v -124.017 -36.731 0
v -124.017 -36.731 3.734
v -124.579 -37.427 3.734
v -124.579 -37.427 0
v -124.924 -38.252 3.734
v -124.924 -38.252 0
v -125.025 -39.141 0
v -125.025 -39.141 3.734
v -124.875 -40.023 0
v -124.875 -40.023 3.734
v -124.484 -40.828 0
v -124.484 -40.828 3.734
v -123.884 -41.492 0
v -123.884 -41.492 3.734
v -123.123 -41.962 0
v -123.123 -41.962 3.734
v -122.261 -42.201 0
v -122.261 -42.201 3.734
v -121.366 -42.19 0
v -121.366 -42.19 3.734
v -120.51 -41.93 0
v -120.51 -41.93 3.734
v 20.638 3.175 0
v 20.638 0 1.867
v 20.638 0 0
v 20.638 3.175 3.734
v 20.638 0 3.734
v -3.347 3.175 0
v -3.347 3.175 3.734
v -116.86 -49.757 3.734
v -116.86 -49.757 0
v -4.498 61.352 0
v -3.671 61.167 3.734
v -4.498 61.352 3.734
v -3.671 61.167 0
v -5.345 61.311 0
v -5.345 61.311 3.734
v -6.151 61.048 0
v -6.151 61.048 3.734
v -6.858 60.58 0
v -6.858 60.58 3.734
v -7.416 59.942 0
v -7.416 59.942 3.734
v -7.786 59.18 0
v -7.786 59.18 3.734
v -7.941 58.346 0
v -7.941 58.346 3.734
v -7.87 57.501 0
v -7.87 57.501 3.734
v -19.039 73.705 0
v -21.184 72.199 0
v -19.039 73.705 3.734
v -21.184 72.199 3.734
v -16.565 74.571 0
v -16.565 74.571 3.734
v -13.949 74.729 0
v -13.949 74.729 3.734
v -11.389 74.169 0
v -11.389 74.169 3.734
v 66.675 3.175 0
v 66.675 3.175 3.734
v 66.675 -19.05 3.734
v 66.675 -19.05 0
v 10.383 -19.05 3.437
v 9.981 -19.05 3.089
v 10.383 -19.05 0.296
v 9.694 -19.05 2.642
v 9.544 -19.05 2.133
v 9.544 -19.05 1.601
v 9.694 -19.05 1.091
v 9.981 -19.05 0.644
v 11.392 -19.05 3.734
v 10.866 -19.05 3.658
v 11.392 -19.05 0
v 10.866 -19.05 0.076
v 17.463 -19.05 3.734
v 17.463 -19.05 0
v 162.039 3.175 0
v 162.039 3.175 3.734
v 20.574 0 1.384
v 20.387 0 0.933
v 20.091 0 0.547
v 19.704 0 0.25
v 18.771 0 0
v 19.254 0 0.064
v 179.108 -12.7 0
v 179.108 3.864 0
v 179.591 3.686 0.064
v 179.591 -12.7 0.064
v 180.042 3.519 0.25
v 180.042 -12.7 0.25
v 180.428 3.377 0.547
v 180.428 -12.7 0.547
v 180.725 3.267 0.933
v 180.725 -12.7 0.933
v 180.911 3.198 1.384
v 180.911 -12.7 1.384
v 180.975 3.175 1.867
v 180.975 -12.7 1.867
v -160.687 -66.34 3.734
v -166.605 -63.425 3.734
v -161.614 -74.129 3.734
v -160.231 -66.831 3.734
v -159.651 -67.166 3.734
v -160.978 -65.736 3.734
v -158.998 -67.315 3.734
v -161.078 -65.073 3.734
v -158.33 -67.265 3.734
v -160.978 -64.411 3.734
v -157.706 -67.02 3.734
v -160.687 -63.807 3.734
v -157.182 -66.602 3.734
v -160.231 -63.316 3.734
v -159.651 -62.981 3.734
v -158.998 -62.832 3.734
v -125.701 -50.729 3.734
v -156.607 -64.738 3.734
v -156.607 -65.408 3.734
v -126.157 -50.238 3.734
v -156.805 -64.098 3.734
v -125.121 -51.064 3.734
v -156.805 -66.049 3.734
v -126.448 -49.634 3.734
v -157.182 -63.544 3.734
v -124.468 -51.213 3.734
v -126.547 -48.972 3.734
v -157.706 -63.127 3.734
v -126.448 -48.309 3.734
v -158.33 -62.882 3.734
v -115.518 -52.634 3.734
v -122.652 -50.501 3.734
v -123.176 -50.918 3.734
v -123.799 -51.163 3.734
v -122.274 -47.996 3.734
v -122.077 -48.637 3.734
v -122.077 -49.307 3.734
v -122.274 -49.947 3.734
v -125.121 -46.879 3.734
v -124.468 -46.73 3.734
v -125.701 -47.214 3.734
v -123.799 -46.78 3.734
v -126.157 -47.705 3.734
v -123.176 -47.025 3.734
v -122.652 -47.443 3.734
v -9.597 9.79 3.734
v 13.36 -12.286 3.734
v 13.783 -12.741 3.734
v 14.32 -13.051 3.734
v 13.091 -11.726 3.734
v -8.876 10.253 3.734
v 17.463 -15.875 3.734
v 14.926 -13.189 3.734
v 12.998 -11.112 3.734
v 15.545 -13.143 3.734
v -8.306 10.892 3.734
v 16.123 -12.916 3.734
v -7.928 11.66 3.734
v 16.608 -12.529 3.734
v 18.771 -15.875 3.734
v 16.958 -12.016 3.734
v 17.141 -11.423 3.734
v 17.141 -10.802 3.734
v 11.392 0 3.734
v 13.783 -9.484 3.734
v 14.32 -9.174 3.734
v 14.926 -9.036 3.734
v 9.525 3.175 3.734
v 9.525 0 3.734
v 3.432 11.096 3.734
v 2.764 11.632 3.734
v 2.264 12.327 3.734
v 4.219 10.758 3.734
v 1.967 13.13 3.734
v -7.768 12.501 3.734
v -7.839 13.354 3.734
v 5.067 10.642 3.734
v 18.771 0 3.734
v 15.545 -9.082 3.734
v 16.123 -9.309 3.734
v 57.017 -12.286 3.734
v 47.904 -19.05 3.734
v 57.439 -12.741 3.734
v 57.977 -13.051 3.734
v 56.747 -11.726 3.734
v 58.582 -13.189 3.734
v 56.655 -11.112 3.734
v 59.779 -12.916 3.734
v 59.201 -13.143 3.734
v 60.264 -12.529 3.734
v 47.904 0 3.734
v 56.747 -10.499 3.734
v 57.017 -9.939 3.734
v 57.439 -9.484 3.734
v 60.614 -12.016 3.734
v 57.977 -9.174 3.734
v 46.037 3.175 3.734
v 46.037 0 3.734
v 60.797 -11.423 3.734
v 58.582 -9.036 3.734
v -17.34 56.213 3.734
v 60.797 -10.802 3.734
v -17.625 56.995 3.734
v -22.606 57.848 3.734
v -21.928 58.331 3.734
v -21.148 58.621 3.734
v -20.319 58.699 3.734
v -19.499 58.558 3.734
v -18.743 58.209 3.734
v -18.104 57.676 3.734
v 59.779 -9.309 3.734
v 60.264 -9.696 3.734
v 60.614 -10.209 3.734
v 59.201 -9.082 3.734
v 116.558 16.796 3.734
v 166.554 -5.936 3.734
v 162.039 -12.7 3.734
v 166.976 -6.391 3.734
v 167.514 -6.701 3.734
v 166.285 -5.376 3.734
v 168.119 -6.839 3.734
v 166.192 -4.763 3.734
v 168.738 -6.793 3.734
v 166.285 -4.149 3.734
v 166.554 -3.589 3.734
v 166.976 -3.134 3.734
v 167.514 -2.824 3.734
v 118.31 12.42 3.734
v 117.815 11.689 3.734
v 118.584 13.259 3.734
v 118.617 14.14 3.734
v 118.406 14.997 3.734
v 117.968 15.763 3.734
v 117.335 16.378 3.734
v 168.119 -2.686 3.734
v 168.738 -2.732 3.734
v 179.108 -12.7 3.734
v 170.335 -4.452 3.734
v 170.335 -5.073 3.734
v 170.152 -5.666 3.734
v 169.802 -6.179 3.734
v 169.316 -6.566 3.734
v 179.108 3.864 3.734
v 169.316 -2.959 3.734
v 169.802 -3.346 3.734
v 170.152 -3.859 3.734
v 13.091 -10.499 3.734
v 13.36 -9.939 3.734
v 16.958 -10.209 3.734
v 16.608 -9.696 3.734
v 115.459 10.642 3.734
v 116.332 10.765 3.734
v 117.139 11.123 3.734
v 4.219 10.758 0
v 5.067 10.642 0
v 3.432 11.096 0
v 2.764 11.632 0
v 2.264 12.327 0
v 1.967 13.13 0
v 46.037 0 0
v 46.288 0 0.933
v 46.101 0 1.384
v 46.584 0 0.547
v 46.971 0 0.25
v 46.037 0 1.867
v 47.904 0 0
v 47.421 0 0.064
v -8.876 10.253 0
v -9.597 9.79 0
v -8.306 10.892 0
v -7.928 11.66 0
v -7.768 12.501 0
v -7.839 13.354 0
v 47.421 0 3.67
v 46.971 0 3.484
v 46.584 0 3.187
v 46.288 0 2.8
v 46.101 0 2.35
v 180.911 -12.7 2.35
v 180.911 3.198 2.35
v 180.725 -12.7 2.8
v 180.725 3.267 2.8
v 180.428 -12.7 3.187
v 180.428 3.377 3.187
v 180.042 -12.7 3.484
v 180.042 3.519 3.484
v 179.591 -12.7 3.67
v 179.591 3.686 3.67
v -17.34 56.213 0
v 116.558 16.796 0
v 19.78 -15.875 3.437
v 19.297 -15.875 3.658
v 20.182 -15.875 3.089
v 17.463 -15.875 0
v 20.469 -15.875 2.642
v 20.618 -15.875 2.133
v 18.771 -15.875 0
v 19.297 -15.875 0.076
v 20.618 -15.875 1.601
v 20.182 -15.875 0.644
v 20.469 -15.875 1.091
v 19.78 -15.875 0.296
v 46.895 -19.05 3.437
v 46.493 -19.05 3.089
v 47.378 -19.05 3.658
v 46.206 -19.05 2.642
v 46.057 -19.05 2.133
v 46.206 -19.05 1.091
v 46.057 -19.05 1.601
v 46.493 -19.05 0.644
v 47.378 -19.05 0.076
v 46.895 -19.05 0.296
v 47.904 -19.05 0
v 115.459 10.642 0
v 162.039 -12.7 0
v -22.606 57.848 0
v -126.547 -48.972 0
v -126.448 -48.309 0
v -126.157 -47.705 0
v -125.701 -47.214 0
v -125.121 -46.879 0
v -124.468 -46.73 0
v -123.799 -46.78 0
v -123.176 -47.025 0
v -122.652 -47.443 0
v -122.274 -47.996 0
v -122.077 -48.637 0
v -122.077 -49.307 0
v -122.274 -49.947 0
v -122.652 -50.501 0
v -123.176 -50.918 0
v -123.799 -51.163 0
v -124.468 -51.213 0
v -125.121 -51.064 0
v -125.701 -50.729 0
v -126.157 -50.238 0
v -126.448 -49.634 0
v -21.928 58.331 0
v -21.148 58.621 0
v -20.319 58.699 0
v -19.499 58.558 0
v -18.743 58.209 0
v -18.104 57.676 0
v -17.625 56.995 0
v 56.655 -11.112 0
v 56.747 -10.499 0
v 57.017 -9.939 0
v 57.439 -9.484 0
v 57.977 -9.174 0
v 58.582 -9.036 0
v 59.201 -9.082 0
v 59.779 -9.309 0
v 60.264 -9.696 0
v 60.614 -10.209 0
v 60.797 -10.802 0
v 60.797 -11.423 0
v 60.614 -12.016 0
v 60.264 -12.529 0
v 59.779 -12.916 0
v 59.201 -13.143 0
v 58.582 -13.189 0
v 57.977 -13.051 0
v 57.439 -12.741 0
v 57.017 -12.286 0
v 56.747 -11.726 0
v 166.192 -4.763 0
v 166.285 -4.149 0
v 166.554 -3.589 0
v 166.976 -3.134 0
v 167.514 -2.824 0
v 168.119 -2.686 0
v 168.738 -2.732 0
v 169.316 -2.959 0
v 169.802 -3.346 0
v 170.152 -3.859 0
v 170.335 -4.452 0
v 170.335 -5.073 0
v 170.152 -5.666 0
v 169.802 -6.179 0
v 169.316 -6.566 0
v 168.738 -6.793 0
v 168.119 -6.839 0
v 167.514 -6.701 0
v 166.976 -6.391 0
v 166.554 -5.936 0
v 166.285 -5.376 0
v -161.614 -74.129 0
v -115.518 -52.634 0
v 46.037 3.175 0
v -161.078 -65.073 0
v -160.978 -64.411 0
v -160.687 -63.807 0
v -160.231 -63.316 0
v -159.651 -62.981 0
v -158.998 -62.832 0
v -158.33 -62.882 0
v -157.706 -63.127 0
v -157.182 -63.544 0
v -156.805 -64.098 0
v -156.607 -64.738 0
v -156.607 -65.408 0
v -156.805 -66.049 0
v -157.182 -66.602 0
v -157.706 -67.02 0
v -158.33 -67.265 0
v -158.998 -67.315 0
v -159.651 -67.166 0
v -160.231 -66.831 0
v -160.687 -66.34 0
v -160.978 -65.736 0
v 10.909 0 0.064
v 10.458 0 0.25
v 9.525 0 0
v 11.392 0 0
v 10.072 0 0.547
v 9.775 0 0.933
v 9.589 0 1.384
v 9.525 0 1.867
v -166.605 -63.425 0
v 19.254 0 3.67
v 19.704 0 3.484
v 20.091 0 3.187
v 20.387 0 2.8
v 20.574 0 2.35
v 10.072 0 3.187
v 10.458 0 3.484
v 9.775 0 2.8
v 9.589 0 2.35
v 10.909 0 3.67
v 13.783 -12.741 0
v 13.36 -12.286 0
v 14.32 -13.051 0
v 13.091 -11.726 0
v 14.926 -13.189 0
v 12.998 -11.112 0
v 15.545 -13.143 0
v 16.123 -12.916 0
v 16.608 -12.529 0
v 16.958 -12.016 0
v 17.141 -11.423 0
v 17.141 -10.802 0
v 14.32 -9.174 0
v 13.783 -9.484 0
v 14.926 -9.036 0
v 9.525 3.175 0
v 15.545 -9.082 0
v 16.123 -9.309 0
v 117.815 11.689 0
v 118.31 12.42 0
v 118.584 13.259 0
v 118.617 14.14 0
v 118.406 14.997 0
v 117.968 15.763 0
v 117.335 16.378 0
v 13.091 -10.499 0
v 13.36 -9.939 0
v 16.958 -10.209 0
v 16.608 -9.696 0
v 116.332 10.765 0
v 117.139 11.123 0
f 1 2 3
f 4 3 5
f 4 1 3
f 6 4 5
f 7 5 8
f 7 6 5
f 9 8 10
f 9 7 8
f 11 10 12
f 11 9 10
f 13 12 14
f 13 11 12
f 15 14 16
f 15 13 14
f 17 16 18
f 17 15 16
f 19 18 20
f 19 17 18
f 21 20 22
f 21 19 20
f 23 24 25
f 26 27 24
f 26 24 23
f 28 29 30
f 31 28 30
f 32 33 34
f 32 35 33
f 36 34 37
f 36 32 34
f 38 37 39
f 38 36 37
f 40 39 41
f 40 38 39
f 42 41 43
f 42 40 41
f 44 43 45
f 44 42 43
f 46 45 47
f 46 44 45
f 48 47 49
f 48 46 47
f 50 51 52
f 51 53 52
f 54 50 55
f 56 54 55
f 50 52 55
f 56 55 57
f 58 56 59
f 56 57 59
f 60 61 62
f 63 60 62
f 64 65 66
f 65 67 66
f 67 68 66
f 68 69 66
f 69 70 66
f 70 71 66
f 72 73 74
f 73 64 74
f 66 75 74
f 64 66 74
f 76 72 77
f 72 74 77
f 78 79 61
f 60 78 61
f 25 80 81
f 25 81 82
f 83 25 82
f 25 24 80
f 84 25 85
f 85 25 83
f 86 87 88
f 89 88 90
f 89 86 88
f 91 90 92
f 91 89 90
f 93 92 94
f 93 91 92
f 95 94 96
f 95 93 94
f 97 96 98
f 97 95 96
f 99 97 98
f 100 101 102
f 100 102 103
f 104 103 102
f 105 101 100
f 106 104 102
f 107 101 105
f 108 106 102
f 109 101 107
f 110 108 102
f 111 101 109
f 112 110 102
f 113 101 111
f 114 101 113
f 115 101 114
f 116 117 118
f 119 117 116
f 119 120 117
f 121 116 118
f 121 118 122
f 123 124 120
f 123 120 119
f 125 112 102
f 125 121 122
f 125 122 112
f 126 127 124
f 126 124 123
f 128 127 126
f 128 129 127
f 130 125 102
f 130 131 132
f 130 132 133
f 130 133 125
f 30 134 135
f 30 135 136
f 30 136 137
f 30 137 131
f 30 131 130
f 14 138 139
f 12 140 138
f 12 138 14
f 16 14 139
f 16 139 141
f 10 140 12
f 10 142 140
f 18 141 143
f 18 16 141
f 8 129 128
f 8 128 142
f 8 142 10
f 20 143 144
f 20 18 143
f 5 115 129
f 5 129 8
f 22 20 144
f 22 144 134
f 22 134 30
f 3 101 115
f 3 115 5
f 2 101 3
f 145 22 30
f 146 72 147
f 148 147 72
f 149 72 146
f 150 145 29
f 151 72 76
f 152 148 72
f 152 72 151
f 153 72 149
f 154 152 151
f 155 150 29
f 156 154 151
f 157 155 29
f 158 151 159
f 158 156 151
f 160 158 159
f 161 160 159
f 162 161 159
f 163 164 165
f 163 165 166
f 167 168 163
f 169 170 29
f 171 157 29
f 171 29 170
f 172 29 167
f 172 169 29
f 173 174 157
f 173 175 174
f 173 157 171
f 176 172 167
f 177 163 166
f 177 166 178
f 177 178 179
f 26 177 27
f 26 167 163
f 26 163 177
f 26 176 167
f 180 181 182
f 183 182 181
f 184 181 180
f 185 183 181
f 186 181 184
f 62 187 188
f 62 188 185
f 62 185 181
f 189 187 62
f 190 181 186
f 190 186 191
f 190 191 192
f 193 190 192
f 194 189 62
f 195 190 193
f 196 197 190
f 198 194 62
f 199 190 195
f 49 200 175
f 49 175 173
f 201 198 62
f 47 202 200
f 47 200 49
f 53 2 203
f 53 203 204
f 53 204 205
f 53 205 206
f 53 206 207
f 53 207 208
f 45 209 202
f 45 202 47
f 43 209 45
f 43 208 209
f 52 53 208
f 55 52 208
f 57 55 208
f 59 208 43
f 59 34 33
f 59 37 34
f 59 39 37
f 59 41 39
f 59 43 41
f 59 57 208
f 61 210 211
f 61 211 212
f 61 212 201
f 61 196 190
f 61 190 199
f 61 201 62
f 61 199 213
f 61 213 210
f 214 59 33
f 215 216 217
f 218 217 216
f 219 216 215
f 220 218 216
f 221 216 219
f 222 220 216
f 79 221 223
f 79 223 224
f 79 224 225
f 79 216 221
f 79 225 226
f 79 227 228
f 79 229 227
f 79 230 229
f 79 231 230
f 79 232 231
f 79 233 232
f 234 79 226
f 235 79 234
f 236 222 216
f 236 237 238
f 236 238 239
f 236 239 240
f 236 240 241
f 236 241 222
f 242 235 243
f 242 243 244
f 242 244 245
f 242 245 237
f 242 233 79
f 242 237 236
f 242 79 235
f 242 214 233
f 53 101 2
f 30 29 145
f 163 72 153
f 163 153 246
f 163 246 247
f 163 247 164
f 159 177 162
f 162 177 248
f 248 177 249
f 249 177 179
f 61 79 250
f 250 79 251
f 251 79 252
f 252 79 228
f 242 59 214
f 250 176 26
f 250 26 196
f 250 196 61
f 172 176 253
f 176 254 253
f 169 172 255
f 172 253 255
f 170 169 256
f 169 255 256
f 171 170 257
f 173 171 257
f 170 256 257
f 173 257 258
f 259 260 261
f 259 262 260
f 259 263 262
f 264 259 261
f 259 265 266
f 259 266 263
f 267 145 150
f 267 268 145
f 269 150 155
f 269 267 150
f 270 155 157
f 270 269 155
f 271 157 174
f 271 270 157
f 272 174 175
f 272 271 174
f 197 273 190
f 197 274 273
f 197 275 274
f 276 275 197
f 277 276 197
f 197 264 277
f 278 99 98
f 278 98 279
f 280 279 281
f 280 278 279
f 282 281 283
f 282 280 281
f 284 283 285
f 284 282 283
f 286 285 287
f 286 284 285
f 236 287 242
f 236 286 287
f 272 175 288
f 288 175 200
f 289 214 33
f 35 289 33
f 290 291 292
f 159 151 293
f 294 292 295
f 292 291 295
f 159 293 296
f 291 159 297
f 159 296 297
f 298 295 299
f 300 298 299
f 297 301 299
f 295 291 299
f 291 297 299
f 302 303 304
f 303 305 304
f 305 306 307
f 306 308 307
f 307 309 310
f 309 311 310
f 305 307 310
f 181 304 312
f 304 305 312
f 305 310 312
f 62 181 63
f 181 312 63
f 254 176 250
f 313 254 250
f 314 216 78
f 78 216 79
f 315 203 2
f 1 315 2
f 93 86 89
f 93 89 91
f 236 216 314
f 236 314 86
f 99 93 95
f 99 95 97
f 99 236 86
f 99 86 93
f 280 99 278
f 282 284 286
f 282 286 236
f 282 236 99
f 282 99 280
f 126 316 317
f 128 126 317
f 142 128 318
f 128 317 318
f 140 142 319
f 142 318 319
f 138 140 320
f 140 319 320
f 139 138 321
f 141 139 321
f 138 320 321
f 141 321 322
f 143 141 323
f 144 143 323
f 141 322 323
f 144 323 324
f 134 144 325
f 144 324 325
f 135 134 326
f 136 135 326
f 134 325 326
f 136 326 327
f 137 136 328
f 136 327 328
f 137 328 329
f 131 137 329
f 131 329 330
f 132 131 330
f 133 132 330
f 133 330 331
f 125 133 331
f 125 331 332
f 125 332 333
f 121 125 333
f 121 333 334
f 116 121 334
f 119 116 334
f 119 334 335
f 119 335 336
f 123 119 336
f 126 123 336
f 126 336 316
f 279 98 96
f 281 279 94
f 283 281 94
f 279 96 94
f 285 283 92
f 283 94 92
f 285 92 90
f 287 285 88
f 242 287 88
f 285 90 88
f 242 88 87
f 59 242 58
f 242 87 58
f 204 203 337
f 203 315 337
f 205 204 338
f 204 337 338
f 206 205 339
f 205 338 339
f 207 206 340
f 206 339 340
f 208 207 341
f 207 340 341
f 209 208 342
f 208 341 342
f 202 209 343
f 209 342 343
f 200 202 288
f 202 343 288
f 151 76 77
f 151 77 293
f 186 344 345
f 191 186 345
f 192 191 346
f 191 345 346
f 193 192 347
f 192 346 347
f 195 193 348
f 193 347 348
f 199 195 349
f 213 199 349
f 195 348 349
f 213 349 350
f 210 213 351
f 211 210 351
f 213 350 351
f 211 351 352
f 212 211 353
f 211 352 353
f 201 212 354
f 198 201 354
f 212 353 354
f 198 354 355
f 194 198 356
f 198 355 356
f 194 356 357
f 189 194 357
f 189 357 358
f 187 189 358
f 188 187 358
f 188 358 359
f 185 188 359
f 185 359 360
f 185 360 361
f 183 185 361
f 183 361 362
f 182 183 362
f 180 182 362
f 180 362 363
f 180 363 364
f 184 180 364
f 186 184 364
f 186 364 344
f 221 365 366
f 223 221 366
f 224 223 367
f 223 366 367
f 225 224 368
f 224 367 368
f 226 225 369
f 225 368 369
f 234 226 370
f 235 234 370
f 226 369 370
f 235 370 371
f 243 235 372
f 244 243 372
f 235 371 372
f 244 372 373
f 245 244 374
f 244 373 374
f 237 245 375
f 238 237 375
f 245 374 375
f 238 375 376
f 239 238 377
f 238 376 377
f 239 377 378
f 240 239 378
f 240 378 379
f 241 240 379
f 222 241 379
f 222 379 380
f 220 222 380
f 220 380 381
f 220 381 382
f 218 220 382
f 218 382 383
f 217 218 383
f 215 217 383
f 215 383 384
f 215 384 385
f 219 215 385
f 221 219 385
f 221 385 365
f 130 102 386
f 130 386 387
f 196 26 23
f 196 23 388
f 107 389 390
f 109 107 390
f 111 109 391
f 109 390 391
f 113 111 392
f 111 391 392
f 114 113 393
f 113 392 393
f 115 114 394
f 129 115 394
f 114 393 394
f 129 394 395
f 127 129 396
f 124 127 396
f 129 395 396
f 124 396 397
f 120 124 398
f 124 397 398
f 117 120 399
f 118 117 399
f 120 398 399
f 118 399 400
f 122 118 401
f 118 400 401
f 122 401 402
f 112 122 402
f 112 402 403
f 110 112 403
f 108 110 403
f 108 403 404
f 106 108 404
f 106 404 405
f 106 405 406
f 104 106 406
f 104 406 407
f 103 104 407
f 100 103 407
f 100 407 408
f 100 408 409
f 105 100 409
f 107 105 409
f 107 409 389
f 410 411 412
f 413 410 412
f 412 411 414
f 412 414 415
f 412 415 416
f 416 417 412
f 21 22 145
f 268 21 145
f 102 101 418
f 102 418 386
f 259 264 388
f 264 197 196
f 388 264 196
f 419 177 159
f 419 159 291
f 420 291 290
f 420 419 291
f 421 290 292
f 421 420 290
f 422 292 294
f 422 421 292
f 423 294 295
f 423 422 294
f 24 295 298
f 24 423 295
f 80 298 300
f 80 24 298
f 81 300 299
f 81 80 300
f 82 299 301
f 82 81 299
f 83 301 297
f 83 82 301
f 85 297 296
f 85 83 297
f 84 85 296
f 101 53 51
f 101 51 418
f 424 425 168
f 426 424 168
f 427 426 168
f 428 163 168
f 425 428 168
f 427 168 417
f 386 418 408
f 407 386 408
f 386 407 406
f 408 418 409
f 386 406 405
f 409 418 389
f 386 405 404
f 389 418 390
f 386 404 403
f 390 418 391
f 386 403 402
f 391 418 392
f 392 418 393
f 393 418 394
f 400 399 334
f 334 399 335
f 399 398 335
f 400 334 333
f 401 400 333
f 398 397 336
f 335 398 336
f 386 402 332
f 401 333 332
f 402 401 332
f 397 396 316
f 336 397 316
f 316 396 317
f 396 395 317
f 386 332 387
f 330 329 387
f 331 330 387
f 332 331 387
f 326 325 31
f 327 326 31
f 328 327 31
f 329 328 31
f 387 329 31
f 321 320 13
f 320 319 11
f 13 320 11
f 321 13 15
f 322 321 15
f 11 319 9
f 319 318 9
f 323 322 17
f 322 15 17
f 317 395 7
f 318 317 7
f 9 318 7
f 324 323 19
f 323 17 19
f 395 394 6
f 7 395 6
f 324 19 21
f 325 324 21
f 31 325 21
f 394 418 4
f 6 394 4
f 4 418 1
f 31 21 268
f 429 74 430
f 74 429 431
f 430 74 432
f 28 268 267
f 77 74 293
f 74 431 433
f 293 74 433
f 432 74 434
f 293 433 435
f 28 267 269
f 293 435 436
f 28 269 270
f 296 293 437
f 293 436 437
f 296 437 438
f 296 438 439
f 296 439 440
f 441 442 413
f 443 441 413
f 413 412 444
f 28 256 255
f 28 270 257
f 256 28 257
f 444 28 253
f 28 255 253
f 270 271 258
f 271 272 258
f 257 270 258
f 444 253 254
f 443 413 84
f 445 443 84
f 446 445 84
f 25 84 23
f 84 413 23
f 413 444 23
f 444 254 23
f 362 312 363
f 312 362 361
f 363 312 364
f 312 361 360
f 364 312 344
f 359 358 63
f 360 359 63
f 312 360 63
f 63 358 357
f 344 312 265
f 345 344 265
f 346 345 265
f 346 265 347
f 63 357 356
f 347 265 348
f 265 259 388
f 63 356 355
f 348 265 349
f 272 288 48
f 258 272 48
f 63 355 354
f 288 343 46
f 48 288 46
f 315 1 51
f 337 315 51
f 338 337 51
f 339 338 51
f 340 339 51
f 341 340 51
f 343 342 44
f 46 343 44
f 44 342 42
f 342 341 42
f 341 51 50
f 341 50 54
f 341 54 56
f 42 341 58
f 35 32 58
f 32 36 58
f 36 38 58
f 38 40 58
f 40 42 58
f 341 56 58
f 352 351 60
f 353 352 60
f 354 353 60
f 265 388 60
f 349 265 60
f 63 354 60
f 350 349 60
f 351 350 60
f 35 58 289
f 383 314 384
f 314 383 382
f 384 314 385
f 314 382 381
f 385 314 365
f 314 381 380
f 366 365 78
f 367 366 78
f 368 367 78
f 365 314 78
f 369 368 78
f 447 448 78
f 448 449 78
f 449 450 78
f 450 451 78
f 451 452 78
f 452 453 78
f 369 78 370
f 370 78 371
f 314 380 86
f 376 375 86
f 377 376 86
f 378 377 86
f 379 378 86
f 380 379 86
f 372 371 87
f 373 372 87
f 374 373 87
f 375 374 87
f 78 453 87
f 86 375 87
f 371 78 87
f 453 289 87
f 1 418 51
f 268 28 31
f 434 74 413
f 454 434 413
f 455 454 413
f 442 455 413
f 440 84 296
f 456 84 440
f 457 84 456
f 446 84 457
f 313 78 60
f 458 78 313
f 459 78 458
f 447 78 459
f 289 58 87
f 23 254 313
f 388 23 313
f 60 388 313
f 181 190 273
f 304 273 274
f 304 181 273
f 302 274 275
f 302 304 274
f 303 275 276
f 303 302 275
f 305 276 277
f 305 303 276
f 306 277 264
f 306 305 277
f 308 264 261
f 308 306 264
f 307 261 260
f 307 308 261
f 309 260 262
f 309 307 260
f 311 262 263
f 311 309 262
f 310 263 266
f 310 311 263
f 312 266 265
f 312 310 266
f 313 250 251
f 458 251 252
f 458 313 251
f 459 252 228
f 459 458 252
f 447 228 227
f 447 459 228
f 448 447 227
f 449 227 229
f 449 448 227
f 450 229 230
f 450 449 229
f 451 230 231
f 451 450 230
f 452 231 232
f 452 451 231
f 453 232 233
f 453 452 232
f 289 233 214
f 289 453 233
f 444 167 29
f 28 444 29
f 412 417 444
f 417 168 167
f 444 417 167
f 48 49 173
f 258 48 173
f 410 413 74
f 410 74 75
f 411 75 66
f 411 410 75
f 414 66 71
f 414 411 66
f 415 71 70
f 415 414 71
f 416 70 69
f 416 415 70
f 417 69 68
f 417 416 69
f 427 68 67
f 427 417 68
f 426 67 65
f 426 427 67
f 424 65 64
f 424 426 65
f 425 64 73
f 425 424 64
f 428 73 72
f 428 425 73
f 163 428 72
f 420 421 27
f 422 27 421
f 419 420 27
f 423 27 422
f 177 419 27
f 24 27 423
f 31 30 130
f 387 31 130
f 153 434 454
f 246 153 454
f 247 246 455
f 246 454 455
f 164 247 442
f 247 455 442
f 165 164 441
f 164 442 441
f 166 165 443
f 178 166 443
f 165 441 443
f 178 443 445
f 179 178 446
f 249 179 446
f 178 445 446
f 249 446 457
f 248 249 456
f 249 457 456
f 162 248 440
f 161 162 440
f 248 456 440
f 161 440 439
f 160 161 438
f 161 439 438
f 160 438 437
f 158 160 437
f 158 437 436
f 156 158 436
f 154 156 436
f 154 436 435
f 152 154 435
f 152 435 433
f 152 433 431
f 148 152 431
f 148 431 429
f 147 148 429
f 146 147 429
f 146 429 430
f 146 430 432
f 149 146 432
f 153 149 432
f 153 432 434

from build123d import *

# Parameters (mm, degrees)
BOSS_EXTRUDE1_DEPTH     = 3.7338
BOSS_EXTRUDE2_DEPTH     = 3.7338
CUT_EXTRUDE1_DEPTH      = 197.398400929
FILLET7_R               = 9.525
FILLET8_R               = 3.175
F_8_32_TAPPED_HOLE2_D   = 4.1656
FILLET3_RADIUS          = 1.8669
FILLET3_LENGTH          = 19.05
FILLET4_RADIUS          = 1.8669
FILLET4_LENGTH          = 19.05
FILLET5_RADIUS          = 1.8669
FILLET5_LENGTH          = 19.05
FILLET6_START           = -20
FILLET6_DEPTH           = 25
F_8_CLEARANCE_HOLE1_D   = 4.4958
CUT_EXTRUDE2_DEPTH      = 196.843388239
CUT_EXTRUDE3_DEPTH      = 196.843388239
SKETCH15_W              = 95.363977372
SKETCH15_H              = 7.9375
CUT_EXTRUDE4_DEPTH      = 196.843388239
SKETCH16_W              = 18.936022628
SKETCH16_H              = 6.35
CUT_EXTRUDE5_DEPTH      = 196.843388239
CUT_EXTRUDE6_DEPTH      = 196.843388239
CUT_EXTRUDE6_DEPTH_BACK = 196.843388239
SKETCH17_W              = 3.175
SKETCH17_H              = 3.175
SKETCH18_W              = 25.4
SKETCH18_H              = 3.175
CUT_EXTRUDE7_DEPTH      = 196.843388239


with BuildPart() as part:
    # Sketch1 → Boss-Extrude1 (new body)
    with BuildSketch(Plane.XY):
        Polygon((0, 0), (9.525, 0), (9.525, -19.05), (20.6375, -19.05), (20.6375, 0), (46.0375, 0), (46.0375, -19.05), (180.975, -19.05), (180.975, 3.175), (-16.893133293, 76.2), align=None)
    extrude(amount=BOSS_EXTRUDE1_DEPTH)

    # Sketch7 → Boss-Extrude2 (add)
    with BuildSketch(Plane.XY.offset(3.7338)):
        Polygon((-161.613635382, -74.129081959), (-0.247657199, 1.117109433), (-16.893133293, 76.2), (-166.605179671, -63.424680687), align=None)
    extrude(amount=-BOSS_EXTRUDE2_DEPTH)

    # Sketch8 → Cut-Extrude1 (cut, through all)
    with BuildSketch(Plane.XY.offset(3.7338)):
        Polygon((2.518832326, 10.642109433), (133.231722564, 10.642109433), (-9.128883742, 63.181561352), align=None)
        Polygon((-18.542737866, 61.637057548), (-138.674453357, -50.400369109), (-7.28718114, 10.86652211), align=None)
    extrude(amount=-CUT_EXTRUDE1_DEPTH, mode=Mode.SUBTRACT)

    # Fillet7
    fillet7_edges = [part.edges().sort_by_distance(p)[0] for p in [
        (-16.893133293, 76.2, 1.8669),
    ]]
    fillet(fillet7_edges, radius=FILLET7_R)

    # Fillet8
    fillet8_edges = [part.edges().sort_by_distance(p)[0] for p in [
        (-9.128883742, 63.181561352, 1.8669),
        (133.231722564, 10.642109433, 1.8669),
        (2.518832326, 10.642109433, 1.8669),
        (-7.28718114, 10.86652211, 1.8669),
        (-138.674453357, -50.400369109, 1.8669),
        (-18.542737866, 61.637057548, 1.8669),
    ]]
    fillet(fillet8_edges, radius=FILLET8_R)

    # #8-32 Tapped Hole2 (through all)
    with Locations(Plane.XY.offset(3.7338)):
        with Locations((15.08125, -11.1125), (58.7375, -11.1125), (168.275, -4.7625)):
            Hole(F_8_32_TAPPED_HOLE2_D / 2)

    # Fillet3: full round fillet: the end face becomes a half cylinder, R = half its width
    fillet3_face = Plane((9.525, -9.525, 1.8669), x_dir=(0, 1, 0), z_dir=(-1, 0, 0))  # on the end face: x along it, z out of the body
    fillet3_slab = fillet3_face.offset(-FILLET3_RADIUS / 2) * Box(FILLET3_LENGTH, 2 * FILLET3_RADIUS, FILLET3_RADIUS, mode=Mode.PRIVATE)  # the body's end, R deep
    fillet3_round = Plane((11.3919, -9.525, 1.8669), x_dir=(-1, 0, 0), z_dir=(0, 1, 0)) * Cylinder(FILLET3_RADIUS, FILLET3_LENGTH, mode=Mode.PRIVATE)  # its axis R under the face
    add(fillet3_slab - fillet3_round, mode=Mode.SUBTRACT)

    # Fillet4: full round fillet: the end face becomes a half cylinder, R = half its width
    fillet4_face = Plane((20.6375, -9.525, 1.8669), x_dir=(0, 1, 0), z_dir=(1, 0, 0))  # on the end face: x along it, z out of the body
    fillet4_slab = fillet4_face.offset(-FILLET4_RADIUS / 2) * Box(FILLET4_LENGTH, 2 * FILLET4_RADIUS, FILLET4_RADIUS, mode=Mode.PRIVATE)  # the body's end, R deep
    fillet4_round = Plane((18.7706, -9.525, 1.8669), x_dir=(1, 0, 0), z_dir=(0, 1, 0)) * Cylinder(FILLET4_RADIUS, FILLET4_LENGTH, mode=Mode.PRIVATE)  # its axis R under the face
    add(fillet4_slab - fillet4_round, mode=Mode.SUBTRACT)

    # Fillet5: full round fillet: the end face becomes a half cylinder, R = half its width
    fillet5_face = Plane((46.0375, -9.525, 1.8669), x_dir=(0, -1, 0), z_dir=(-1, 0, 0))  # on the end face: x along it, z out of the body
    fillet5_slab = fillet5_face.offset(-FILLET5_RADIUS / 2) * Box(FILLET5_LENGTH, 2 * FILLET5_RADIUS, FILLET5_RADIUS, mode=Mode.PRIVATE)  # the body's end, R deep
    fillet5_round = Plane((47.9044, -9.525, 1.8669), x_dir=(-1, 0, 0), z_dir=(0, -1, 0)) * Cylinder(FILLET5_RADIUS, FILLET5_LENGTH, mode=Mode.PRIVATE)  # its axis R under the face
    add(fillet5_slab - fillet5_round, mode=Mode.SUBTRACT)

    # Fillet6: read off the stored shape, not the designer's step
    # Fillet6 outline → Fillet6 (cut)
    with BuildSketch(Plane(origin=(0, 0, 0), x_dir=(1, 0, 0), z_dir=(0, 1, 0)).offset(FILLET6_START)):
        with BuildLine():
            ThreePointArc((179.1081, 0), (180.42819765, -0.54680235), (180.975, -1.8669))
            Line((180.975, -1.8669), (180.975, 0))
            Line((180.975, 0), (179.1081, 0))
        make_face()
        with BuildLine():
            ThreePointArc((180.975, -1.8669), (180.42819765, -3.18699765), (179.1081, -3.7338))
            Line((179.1081, -3.7338), (180.975, -3.7338))
            Line((180.975, -3.7338), (180.975, -1.8669))
        make_face()
    extrude(amount=FILLET6_DEPTH, mode=Mode.SUBTRACT)

    # #8 Clearance Hole1 (through all)
    with Locations(Plane.XY.offset(3.7338)):
        with Locations((-158.829891599, -65.073459713), (-124.299564913, -48.97170394)):
            Hole(F_8_CLEARANCE_HOLE1_D / 2)

    # Sketch12 → Cut-Extrude2 (cut, through all)
    with BuildSketch(Plane.XY.offset(3.7338)):
        Polygon((-0.247657199, 1.117109433), (0, 1.232593882), (0, 0), align=None)
    extrude(amount=-CUT_EXTRUDE2_DEPTH, mode=Mode.SUBTRACT)

    # Sketch14 → Cut-Extrude3 (cut, through all)
    with BuildSketch(Plane.XY.offset(3.7338)):
        with BuildLine():
            Line((71.4375, -6.35), (157.276477372, -6.35))
            ThreePointArc((157.276477372, -6.35), (162.038977372, -11.1125), (157.276477372, -15.875))
            Line((157.276477372, -15.875), (71.4375, -15.875))
            ThreePointArc((71.4375, -15.875), (66.675, -11.1125), (71.4375, -6.35))
        make_face()
    extrude(amount=-CUT_EXTRUDE3_DEPTH, mode=Mode.SUBTRACT)

    # Sketch15 → Cut-Extrude4 (cut, through all)
    with BuildSketch(Plane.XY.offset(3.7338)):
        with Locations((114.356988686, -15.08125)):
            Rectangle(SKETCH15_W, SKETCH15_H)
    extrude(amount=-CUT_EXTRUDE4_DEPTH, mode=Mode.SUBTRACT)

    # Sketch16 → Cut-Extrude5 (cut, through all)
    with BuildSketch(Plane.XY.offset(3.7338)):
        with Locations((171.506988686, -15.875)):
            Rectangle(SKETCH16_W, SKETCH16_H)
    extrude(amount=-CUT_EXTRUDE5_DEPTH, mode=Mode.SUBTRACT)

    # Sketch17 → Cut-Extrude6 (cut, two sides: drawn at the far end of the back side and taken through both)
    with BuildSketch(Plane.XY.offset(3.7338).offset(-CUT_EXTRUDE6_DEPTH_BACK)):
        with Locations((19.05, -17.4625)):
            Rectangle(SKETCH17_W, SKETCH17_H)
    extrude(amount=CUT_EXTRUDE6_DEPTH + CUT_EXTRUDE6_DEPTH_BACK, mode=Mode.SUBTRACT)

    # Sketch18 → Cut-Extrude7 (cut, through all)
    with BuildSketch(Plane.XY.offset(3.7338)):
        Polygon((-3.347186663, 3.175), (-2.005373682, 0.297472776), (0, 1.232593882), (0, 0), (9.525, 0), (9.525, 3.175), align=None)
        Polygon((-116.86007736, -49.756930231), (-115.518264379, -52.634457455), (-2.005373682, 0.297472776), (-3.347186663, 3.175), align=None)
        with Locations((33.3375, 1.5875)):
            Rectangle(SKETCH18_W, SKETCH18_H)
        with BuildLine():
            ThreePointArc((157.276477372, -6.35), (160.644073417, -7.744903955), (162.038977372, -11.1125))
            Line((162.038977372, -11.1125), (162.038977372, 3.175))
            Line((162.038977372, 3.175), (66.675, 3.175))
            Line((66.675, 3.175), (66.675, -11.1125))
            ThreePointArc((66.675, -11.1125), (68.069903955, -7.744903955), (71.4375, -6.35))
            Line((71.4375, -6.35), (157.276477372, -6.35))
        make_face()
    extrude(amount=-CUT_EXTRUDE7_DEPTH, mode=Mode.SUBTRACT)


solid = part.part
